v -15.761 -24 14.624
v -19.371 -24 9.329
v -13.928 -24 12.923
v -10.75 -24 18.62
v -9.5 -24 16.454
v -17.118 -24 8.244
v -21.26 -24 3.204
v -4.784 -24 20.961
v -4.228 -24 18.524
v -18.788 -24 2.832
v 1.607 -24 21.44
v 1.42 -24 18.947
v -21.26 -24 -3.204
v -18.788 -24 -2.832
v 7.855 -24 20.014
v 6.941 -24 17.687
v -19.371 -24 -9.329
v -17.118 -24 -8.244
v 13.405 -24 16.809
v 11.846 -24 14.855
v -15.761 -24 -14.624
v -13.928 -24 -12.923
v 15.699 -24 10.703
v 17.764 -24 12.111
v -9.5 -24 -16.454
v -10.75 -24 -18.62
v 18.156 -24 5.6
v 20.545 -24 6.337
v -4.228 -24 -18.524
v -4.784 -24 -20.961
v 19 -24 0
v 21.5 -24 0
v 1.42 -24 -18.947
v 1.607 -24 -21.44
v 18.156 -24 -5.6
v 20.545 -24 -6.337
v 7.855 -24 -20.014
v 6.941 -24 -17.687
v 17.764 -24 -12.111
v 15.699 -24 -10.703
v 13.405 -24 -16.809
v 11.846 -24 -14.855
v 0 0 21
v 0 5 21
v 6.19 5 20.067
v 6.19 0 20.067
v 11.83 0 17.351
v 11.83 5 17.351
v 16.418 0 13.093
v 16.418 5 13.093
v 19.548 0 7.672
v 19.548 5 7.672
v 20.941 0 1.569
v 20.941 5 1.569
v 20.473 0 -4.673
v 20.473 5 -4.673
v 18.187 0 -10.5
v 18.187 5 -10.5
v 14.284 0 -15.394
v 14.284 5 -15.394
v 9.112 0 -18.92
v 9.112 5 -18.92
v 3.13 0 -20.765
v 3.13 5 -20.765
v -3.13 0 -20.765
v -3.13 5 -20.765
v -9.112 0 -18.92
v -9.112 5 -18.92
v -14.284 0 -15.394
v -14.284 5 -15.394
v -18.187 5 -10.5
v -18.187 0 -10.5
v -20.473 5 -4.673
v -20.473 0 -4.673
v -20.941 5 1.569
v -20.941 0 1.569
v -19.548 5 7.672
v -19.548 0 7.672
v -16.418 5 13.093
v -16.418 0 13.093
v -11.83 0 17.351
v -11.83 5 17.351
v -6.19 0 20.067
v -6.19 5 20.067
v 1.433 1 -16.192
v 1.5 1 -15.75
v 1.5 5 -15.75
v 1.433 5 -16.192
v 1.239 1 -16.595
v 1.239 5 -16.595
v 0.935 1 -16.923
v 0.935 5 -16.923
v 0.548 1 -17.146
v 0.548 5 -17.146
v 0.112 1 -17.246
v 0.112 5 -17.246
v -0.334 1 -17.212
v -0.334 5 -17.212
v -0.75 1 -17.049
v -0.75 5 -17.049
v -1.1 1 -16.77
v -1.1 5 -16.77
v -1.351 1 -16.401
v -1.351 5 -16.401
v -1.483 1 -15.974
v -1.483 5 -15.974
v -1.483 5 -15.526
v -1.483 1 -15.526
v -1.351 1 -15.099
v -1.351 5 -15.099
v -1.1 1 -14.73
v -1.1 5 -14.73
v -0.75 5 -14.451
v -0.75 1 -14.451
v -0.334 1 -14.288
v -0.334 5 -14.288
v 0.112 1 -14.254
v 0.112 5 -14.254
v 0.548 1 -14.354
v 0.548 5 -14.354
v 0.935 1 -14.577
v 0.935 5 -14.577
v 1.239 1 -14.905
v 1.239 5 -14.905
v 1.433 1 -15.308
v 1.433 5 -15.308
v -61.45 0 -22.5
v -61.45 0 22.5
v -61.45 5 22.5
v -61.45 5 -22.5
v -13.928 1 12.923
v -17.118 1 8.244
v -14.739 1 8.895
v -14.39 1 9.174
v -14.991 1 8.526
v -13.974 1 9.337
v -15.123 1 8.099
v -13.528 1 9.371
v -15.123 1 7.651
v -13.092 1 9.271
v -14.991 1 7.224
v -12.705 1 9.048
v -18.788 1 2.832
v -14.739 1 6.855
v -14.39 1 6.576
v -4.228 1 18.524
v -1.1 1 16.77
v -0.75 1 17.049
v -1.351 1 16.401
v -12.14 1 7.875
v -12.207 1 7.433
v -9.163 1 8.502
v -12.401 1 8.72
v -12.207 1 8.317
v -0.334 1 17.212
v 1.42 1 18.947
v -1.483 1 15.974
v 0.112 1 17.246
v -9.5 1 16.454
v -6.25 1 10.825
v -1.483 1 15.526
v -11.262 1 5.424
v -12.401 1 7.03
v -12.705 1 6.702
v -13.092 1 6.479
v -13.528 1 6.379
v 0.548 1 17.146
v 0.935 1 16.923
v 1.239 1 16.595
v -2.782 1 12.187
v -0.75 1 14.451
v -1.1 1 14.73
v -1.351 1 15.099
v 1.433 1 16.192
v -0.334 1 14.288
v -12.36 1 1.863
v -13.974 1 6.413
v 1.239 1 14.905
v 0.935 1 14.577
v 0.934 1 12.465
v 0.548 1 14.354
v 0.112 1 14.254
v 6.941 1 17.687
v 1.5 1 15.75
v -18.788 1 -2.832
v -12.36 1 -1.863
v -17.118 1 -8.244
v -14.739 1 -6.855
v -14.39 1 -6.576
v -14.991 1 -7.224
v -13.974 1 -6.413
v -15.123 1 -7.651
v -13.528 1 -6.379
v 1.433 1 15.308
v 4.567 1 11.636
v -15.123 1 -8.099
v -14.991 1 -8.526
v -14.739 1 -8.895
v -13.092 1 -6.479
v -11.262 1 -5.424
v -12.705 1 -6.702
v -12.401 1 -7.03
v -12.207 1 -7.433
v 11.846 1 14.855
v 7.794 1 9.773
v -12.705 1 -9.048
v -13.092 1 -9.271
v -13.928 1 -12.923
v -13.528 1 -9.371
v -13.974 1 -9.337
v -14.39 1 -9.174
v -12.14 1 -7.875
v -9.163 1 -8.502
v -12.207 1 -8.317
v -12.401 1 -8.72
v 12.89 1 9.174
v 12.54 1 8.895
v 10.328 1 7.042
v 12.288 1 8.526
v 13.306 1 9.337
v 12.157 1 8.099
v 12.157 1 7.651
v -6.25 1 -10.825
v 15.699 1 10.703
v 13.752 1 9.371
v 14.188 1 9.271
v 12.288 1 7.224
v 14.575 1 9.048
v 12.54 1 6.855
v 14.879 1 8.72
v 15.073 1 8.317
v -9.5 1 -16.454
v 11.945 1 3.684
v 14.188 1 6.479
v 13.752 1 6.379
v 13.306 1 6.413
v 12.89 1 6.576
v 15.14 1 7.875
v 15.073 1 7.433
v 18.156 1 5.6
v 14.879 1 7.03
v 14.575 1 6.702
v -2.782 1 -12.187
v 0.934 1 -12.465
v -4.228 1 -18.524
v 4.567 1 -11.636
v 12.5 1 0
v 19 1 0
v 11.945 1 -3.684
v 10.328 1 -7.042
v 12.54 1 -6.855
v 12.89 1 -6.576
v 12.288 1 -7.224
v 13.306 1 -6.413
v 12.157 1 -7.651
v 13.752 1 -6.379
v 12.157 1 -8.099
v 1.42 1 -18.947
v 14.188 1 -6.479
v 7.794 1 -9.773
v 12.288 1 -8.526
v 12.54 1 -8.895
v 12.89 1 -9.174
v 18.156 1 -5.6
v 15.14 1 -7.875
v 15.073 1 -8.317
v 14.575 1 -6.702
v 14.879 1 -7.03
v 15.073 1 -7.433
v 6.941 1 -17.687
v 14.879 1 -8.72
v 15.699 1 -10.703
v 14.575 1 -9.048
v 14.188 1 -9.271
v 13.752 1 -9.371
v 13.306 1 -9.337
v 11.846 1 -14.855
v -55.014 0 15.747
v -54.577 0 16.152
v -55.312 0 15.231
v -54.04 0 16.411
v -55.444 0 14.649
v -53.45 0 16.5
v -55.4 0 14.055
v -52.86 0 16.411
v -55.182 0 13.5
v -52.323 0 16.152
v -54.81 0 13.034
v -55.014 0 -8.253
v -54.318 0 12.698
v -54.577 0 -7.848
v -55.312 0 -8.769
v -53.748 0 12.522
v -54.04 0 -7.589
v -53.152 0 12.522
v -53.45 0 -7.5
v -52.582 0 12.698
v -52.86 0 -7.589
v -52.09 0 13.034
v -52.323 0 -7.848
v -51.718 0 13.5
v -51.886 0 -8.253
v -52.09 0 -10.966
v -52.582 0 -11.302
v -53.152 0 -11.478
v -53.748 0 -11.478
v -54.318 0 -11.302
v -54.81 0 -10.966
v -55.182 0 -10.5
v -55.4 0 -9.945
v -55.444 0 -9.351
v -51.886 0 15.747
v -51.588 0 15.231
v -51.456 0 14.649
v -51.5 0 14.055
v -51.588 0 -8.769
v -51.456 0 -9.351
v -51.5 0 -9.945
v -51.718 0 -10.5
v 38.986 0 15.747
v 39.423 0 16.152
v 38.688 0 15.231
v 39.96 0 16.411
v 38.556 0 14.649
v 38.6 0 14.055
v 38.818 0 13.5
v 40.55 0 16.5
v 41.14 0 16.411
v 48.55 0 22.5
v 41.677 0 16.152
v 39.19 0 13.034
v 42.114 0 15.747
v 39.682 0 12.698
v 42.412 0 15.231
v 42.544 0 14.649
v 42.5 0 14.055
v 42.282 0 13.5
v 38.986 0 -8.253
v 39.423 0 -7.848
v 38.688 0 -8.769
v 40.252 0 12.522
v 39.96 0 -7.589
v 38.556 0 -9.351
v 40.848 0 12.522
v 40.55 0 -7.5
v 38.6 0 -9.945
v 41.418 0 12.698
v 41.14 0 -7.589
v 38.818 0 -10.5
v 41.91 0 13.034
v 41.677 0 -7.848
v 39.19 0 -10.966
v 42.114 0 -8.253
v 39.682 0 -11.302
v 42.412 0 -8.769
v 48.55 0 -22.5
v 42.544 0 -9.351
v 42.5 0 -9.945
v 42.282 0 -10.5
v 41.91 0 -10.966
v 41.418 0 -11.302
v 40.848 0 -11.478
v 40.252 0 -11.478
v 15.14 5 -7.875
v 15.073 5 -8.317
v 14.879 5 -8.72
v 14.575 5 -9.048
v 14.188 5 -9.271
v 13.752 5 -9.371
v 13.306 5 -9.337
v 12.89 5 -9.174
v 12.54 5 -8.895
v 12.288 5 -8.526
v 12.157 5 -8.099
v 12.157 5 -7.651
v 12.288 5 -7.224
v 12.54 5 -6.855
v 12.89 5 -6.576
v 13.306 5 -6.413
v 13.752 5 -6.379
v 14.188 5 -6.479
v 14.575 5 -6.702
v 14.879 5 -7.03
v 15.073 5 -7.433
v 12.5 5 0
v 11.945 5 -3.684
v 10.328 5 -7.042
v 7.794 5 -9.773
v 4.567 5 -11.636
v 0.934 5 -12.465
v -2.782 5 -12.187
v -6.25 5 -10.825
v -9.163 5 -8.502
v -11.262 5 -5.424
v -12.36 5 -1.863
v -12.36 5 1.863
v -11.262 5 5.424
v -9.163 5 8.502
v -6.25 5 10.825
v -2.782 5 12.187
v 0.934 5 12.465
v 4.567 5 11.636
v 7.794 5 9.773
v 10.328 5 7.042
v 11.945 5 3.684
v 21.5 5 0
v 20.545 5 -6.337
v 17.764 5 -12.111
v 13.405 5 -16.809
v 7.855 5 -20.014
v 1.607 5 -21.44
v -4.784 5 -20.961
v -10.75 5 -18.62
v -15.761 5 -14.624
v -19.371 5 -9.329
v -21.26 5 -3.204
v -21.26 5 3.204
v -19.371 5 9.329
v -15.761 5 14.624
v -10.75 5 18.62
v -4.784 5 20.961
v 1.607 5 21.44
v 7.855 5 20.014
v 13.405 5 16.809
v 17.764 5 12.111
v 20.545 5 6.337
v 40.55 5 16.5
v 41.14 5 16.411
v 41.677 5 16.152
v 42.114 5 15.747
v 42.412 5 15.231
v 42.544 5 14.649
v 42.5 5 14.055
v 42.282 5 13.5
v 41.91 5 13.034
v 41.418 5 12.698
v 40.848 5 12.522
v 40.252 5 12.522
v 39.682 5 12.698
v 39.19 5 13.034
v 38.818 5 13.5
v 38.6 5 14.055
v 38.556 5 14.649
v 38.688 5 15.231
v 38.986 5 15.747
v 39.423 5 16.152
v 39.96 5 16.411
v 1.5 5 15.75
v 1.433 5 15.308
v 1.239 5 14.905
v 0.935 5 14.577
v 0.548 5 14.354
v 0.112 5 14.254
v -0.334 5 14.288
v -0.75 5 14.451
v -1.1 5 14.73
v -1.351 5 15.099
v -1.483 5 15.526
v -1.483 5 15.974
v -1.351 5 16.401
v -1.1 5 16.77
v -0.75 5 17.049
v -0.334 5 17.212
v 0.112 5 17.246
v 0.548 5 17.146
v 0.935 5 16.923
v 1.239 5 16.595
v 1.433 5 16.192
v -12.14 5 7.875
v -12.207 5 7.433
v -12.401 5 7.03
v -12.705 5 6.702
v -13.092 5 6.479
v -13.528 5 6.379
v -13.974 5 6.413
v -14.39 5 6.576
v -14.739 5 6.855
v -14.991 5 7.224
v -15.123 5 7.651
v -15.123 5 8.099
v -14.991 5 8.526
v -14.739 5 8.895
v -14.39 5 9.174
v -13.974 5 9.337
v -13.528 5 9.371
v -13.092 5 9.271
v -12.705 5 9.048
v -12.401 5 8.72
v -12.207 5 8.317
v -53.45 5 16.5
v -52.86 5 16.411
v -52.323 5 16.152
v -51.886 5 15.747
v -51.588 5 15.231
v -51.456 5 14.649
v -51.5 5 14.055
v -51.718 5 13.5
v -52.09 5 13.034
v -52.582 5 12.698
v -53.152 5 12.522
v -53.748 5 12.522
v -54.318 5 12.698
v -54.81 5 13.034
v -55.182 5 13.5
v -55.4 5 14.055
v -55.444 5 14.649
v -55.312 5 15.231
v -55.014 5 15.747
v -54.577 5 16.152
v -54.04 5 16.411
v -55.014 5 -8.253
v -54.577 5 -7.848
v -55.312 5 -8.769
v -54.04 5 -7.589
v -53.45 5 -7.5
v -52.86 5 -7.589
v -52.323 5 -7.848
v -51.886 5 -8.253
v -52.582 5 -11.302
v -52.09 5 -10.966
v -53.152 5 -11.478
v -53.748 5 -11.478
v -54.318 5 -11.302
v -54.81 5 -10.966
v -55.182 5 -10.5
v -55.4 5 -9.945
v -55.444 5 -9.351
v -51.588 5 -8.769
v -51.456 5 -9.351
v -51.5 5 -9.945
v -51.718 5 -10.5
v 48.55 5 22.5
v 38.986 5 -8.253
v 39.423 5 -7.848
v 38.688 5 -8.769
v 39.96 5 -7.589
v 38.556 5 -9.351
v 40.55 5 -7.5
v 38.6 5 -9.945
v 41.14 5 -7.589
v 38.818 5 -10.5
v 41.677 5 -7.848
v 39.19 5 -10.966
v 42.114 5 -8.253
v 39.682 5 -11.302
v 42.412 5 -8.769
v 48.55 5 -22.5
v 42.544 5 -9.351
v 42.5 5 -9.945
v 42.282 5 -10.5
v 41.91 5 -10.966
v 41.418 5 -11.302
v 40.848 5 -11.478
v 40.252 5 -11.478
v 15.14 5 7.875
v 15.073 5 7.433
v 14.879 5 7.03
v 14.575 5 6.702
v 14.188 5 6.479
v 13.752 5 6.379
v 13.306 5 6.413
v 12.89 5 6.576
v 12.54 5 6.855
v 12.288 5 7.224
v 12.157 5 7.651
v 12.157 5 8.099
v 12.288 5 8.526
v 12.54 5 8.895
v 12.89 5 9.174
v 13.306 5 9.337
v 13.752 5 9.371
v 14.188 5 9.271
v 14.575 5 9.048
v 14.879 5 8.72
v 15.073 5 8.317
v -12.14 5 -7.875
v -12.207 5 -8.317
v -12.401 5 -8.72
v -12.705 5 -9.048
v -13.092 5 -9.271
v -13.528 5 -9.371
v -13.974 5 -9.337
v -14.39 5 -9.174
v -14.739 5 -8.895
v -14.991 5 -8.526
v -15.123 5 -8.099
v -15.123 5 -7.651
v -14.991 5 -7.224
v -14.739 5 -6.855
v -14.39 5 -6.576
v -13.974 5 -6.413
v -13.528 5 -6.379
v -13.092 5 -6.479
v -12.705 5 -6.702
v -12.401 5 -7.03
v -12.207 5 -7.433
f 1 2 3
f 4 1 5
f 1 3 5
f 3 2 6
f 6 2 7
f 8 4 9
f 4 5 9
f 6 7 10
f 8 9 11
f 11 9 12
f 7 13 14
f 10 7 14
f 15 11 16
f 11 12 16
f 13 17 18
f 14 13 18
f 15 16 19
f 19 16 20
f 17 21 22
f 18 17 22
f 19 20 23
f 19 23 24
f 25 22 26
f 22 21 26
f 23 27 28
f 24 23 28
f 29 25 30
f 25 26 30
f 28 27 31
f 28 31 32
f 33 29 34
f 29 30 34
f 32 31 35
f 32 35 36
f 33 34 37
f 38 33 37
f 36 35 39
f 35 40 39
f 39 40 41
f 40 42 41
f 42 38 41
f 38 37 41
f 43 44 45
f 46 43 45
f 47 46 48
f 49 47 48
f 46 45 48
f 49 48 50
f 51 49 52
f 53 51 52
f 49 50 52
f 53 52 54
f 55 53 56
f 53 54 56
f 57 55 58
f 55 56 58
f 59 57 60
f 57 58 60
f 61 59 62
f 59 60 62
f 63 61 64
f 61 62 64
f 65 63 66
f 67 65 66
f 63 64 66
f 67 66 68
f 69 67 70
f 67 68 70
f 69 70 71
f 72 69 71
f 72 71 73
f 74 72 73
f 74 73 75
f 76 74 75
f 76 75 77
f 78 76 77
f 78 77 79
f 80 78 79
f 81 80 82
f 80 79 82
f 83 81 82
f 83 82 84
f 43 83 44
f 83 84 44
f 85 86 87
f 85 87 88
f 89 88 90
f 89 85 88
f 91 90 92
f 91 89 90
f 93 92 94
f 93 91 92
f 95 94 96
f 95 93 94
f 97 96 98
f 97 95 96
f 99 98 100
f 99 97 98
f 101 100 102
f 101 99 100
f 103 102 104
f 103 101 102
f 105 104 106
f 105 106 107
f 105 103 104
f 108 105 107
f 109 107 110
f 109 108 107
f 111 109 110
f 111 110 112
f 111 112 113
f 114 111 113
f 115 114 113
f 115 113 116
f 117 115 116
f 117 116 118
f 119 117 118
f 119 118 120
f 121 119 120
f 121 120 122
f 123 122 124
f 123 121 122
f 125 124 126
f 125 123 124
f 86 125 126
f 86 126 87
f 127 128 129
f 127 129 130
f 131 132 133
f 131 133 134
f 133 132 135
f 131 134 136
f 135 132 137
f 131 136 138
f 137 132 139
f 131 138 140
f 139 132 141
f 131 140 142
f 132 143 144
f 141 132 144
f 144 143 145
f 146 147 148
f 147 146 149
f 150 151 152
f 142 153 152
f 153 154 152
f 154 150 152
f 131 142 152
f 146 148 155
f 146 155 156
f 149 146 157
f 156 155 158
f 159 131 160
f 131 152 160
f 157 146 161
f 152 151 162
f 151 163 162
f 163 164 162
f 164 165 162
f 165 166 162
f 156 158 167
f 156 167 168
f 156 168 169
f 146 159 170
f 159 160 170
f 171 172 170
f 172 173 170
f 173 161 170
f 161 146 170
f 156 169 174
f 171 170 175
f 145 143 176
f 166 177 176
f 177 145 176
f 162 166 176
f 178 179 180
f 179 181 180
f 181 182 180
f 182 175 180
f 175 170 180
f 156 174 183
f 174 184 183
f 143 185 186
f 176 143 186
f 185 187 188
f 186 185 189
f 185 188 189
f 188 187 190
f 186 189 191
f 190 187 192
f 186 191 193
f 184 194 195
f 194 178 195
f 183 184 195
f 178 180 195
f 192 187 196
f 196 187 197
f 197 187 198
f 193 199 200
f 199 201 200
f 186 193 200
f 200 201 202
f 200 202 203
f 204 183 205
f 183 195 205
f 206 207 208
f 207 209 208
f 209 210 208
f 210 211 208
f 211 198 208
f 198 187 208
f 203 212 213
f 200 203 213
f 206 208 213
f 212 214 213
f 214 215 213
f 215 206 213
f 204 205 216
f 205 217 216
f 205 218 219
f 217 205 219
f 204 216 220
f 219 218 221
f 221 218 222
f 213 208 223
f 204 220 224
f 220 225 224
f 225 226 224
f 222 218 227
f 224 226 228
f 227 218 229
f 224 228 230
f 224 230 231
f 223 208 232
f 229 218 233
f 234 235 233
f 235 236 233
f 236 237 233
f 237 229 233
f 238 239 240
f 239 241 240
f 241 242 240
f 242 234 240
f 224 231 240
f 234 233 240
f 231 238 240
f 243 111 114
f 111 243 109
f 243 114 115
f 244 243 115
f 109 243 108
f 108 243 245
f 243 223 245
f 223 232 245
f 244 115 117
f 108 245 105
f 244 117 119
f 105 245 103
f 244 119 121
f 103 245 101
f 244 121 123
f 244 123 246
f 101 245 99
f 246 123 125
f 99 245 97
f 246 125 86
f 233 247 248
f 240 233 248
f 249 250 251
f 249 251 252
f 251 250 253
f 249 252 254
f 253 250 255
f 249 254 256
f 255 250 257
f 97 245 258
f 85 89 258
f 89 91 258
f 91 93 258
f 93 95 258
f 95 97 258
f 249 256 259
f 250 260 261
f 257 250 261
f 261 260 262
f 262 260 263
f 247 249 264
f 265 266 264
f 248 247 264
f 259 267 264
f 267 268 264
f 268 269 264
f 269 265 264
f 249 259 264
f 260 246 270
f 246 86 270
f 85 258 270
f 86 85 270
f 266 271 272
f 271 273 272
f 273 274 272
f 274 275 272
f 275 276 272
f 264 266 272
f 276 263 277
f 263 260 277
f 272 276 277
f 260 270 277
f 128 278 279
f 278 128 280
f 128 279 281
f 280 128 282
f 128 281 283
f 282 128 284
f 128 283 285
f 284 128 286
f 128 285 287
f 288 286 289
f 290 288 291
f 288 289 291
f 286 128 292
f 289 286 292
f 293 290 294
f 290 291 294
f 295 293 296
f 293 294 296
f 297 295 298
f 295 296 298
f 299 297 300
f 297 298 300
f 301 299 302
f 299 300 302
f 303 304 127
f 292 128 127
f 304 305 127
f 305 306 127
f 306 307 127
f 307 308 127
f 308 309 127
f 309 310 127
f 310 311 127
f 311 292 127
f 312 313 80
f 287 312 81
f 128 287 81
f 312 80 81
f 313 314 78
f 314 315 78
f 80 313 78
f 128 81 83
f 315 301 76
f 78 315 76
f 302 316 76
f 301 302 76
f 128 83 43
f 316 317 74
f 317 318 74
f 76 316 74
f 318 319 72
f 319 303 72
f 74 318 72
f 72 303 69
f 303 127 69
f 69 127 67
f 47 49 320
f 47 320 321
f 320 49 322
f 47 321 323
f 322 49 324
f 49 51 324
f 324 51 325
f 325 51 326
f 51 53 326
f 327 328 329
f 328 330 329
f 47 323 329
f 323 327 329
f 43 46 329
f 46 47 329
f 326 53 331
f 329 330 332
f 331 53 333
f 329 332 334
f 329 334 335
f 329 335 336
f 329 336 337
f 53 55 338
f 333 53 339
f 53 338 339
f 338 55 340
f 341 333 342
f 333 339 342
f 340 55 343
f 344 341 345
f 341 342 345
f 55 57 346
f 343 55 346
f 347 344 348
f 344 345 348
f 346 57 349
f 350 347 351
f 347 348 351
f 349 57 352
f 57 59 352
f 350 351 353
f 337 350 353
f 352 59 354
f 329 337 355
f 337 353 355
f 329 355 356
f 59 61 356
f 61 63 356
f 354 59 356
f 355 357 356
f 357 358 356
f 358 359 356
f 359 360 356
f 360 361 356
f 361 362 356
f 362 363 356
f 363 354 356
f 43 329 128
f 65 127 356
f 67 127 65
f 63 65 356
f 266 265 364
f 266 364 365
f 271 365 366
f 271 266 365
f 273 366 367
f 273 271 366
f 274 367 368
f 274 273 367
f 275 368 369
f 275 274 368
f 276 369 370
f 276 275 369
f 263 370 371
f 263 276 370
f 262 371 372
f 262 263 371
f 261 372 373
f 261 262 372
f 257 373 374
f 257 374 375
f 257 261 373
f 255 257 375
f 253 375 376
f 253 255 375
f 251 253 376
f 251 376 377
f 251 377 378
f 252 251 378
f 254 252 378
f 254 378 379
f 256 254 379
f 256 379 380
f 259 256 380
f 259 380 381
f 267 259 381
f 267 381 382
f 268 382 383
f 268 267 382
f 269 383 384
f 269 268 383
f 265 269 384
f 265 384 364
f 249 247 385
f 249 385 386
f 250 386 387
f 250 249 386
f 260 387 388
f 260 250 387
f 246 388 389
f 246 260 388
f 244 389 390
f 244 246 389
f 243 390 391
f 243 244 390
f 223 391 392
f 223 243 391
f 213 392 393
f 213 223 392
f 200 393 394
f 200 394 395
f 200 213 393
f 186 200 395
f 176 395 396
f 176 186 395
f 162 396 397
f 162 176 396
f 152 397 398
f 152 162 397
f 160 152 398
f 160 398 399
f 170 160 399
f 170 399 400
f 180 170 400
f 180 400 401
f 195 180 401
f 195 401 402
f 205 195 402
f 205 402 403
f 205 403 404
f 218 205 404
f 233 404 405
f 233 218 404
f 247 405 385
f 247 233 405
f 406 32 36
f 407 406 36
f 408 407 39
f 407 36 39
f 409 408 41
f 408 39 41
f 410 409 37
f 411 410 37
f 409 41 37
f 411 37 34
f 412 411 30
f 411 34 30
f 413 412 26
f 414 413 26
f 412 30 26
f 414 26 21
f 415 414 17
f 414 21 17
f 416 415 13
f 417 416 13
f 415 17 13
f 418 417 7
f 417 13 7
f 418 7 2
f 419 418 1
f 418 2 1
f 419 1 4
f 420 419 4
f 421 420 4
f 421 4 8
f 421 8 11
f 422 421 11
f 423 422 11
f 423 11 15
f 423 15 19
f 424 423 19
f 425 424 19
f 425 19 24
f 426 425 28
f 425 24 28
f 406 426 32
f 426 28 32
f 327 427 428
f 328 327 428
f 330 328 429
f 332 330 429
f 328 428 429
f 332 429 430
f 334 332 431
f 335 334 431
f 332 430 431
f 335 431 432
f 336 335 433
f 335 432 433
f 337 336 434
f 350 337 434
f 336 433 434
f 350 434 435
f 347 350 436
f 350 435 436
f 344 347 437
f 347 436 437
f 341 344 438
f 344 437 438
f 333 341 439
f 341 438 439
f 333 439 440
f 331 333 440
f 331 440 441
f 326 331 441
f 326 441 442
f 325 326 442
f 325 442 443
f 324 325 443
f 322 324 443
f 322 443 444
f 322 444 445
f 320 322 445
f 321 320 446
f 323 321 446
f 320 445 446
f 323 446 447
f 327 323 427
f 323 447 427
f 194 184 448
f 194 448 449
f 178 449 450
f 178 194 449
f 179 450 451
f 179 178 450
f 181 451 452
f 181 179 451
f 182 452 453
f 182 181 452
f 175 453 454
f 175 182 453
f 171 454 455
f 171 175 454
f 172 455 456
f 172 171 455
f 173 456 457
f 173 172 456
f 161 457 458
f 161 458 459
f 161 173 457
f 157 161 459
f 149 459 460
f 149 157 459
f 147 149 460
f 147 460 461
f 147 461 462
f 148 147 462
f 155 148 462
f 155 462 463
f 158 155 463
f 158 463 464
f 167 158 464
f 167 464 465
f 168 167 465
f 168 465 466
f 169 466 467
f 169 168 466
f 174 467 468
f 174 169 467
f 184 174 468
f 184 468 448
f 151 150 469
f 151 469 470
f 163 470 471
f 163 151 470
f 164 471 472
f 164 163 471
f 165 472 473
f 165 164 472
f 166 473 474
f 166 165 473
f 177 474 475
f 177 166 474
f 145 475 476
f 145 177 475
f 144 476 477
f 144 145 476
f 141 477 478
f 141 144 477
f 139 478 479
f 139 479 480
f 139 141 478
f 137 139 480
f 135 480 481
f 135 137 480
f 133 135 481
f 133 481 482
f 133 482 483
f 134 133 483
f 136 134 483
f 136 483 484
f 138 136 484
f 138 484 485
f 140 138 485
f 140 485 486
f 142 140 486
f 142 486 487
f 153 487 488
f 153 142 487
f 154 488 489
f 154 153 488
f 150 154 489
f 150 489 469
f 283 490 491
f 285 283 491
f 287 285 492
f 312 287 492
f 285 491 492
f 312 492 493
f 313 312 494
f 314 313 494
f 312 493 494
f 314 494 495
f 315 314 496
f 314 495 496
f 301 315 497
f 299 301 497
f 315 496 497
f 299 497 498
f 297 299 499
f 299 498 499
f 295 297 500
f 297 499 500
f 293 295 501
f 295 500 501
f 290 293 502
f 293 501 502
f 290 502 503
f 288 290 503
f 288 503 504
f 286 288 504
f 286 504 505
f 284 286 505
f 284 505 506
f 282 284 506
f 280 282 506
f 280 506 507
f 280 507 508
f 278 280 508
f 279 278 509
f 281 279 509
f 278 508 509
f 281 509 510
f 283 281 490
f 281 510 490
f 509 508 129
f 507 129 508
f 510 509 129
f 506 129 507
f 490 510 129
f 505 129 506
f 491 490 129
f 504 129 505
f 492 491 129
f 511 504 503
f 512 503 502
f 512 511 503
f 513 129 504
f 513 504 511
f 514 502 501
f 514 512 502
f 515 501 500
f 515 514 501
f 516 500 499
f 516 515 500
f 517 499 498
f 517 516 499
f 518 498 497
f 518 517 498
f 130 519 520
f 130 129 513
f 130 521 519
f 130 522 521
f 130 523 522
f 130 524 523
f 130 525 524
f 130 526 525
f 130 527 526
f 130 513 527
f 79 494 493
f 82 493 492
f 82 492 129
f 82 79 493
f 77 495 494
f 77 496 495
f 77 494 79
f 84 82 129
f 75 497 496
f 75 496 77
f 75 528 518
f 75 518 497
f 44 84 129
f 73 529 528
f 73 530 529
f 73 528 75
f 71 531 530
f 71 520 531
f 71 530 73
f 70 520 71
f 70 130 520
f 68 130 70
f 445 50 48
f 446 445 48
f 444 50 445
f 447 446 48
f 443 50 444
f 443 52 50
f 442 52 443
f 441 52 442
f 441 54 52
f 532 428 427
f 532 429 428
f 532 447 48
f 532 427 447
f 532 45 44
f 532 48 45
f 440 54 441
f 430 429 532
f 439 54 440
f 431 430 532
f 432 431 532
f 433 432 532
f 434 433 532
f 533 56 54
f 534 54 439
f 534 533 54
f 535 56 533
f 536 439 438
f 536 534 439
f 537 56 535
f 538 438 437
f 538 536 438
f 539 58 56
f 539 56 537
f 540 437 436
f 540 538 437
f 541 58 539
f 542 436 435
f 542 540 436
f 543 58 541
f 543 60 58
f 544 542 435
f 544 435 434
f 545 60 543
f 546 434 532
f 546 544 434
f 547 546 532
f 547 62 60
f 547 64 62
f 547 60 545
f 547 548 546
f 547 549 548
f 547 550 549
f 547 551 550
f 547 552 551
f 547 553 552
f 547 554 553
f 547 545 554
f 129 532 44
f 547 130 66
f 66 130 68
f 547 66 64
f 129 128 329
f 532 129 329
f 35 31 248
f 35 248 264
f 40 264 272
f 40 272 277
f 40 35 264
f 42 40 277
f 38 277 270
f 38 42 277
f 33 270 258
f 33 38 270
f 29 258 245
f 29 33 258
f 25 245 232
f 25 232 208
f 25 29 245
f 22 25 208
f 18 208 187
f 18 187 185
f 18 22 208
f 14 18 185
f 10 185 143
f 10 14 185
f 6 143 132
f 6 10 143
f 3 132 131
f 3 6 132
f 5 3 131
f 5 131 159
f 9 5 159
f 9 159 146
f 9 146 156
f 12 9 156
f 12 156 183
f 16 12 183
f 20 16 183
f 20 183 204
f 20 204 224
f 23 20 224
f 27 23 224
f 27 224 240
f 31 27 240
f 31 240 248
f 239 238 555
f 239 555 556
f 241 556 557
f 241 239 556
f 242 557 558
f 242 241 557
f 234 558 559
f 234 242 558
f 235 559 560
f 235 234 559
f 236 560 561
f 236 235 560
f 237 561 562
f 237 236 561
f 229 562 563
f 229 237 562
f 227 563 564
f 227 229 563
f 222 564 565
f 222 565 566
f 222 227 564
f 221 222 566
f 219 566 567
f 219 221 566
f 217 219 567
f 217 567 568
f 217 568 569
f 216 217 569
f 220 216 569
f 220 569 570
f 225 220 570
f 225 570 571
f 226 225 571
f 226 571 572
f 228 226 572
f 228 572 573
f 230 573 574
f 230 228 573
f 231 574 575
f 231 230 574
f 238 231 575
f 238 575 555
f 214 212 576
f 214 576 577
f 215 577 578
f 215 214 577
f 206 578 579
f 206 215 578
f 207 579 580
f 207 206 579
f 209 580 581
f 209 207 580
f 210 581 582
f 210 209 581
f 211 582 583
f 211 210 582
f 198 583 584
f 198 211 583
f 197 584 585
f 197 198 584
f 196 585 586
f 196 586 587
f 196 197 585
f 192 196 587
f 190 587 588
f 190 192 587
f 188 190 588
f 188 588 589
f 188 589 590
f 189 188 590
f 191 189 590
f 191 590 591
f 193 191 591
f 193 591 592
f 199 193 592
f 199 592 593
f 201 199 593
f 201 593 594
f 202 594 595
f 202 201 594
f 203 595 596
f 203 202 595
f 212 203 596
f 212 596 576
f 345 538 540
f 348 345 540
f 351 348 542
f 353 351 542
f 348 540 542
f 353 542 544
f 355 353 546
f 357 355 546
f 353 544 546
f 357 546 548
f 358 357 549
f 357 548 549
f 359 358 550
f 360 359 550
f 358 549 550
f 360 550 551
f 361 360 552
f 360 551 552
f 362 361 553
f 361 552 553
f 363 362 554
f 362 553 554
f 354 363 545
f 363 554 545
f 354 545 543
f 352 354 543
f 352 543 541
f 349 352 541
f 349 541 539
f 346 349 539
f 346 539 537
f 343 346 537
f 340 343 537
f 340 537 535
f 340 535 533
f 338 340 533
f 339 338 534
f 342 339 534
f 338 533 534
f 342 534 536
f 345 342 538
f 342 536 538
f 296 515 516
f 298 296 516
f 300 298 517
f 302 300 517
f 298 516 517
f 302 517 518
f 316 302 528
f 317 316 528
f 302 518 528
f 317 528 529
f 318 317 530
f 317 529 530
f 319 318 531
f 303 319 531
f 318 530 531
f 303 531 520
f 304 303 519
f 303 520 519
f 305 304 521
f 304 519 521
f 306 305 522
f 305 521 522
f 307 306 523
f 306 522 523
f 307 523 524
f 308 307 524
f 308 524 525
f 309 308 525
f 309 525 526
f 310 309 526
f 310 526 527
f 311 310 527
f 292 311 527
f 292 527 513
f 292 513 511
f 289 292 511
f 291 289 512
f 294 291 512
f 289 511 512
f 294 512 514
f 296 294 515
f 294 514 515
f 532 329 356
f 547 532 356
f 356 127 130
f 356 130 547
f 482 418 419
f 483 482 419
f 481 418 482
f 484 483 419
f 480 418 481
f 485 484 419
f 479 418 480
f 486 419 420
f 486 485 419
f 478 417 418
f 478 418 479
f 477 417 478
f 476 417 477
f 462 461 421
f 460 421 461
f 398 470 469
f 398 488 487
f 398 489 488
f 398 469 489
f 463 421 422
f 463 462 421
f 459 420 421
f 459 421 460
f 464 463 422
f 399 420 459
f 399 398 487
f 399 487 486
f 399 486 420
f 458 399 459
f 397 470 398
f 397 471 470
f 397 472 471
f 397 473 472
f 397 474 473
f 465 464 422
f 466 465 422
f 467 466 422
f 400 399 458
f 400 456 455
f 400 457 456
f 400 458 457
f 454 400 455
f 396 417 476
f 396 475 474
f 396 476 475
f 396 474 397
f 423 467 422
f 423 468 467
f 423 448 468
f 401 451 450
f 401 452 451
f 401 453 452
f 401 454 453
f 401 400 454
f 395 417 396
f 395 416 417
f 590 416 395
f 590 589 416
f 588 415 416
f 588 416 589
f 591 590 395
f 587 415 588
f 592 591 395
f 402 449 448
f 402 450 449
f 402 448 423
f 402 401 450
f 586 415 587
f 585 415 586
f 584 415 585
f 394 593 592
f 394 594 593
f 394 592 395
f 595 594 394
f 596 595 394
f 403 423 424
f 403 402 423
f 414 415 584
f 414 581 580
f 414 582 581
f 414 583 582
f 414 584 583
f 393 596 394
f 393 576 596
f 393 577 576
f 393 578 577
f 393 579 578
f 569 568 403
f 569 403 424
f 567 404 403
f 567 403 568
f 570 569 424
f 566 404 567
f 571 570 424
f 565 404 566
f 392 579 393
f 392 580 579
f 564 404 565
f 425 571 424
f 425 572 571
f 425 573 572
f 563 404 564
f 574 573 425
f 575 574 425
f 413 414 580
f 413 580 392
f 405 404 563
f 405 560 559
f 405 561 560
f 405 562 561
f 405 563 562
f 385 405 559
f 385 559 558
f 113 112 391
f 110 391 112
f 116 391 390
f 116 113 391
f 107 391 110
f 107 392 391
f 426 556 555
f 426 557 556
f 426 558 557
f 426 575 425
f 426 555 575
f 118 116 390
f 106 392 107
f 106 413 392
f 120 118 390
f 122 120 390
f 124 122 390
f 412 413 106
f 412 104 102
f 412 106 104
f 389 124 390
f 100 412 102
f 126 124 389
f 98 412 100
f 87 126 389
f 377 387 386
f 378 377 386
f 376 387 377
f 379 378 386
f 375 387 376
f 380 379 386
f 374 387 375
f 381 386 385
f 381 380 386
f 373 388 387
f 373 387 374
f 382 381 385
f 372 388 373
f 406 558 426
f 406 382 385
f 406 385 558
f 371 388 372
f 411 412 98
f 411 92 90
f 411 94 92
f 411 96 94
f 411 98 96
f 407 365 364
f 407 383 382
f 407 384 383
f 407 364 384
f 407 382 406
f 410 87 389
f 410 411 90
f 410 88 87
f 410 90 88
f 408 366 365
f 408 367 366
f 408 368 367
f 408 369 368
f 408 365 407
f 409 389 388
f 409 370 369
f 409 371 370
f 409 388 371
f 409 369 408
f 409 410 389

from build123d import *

# Parameters (mm, degrees)
SKETCH1_W                 = 110
SKETCH1_H                 = 45
BOSS_EXTRUDE1_DEPTH       = 5
SKETCH2_R                 = 21
CUT_EXTRUDE1_DEPTH        = 5
MOTOR_MOUNT_START         = -24
MOTOR_MOUNT_OUTLINE_R     = 21.5
MOTOR_MOUNT_OUTLINE_R_2   = 19
MOTOR_MOUNT_DEPTH         = 29
MOTOR_MOUNT_START_2       = 1
MOTOR_MOUNT_2_OUTLINE_R   = 19
MOTOR_MOUNT_2_OUTLINE_R_2 = 1.5
MOTOR_MOUNT_2_OUTLINE_R_3 = 12.5
MOTOR_MOUNT_2_DEPTH       = 4
SKETCH6_R                 = 2
CUT_EXTRUDE2_DEPTH        = 5
SKETCH7_R                 = 2
CUT_EXTRUDE3_DEPTH        = 5


# Read off the part's stored shape, not the designer's step: motor_mount
with BuildPart() as part:
    # Sketch1 → Boss-Extrude1 (new body)
    with BuildSketch(Plane(origin=(0, 0, 0), x_dir=(1, 0, 0), z_dir=(0, 1, 0))):
        with Locations((-6.45, 0)):
            Rectangle(SKETCH1_W, SKETCH1_H)
    extrude(amount=BOSS_EXTRUDE1_DEPTH)

    # Sketch2 → Cut-Extrude1 (cut)
    with BuildSketch(Plane(origin=(0, 5, 0), x_dir=(1, 0, 0), z_dir=(0, 1, 0))):
        with Locations(Location((0, 0, 0), (0, 0, 270))):
            Circle(SKETCH2_R)
    extrude(amount=-CUT_EXTRUDE1_DEPTH, mode=Mode.SUBTRACT)

    # Sketch6 → Cut-Extrude2 (cut)
    with BuildSketch(Plane(origin=(0, 5, 0), x_dir=(1, 0, 0), z_dir=(0, 1, 0))):
        with Locations(Location((40.55, -14.5, 0), (0, 0, 270))):
            Circle(SKETCH6_R)
        with Locations(Location((40.55, 9.5, 0), (0, 0, 270))):
            Circle(SKETCH6_R)
    extrude(amount=-CUT_EXTRUDE2_DEPTH, mode=Mode.SUBTRACT)

    # Sketch7 → Cut-Extrude3 (cut)
    with BuildSketch(Plane(origin=(0, 5, 0), x_dir=(1, 0, 0), z_dir=(0, 1, 0))):
        with Locations(Location((-53.45, -14.5, 0), (0, 0, 270))):
            Circle(SKETCH7_R)
        with Locations(Location((-53.45, 9.5, 0), (0, 0, 270))):
            Circle(SKETCH7_R)
    extrude(amount=-CUT_EXTRUDE3_DEPTH, mode=Mode.SUBTRACT)


with BuildPart() as body_2:
    # motor_mount outline → motor_mount (new body)
    with BuildSketch(Plane(origin=(0, 0, 0), x_dir=(1, 0, 0), z_dir=(0, 1, 0)).offset(MOTOR_MOUNT_START)):
        Circle(MOTOR_MOUNT_OUTLINE_R)
        Circle(MOTOR_MOUNT_OUTLINE_R_2, mode=Mode.SUBTRACT)
    extrude(amount=MOTOR_MOUNT_DEPTH)

    # motor_mount 2 outline → motor_mount 2 (add)
    with BuildSketch(Plane(origin=(0, 0, 0), x_dir=(1, 0, 0), z_dir=(0, 1, 0)).offset(MOTOR_MOUNT_START_2)):
        Circle(MOTOR_MOUNT_2_OUTLINE_R)
        with Locations((-13.63990011, -7.875)):
            Circle(MOTOR_MOUNT_2_OUTLINE_R_2, mode=Mode.SUBTRACT)
        with Locations((0, -15.75)):
            Circle(MOTOR_MOUNT_2_OUTLINE_R_2, mode=Mode.SUBTRACT)
        with Locations((13.63990011, -7.875)):
            Circle(MOTOR_MOUNT_2_OUTLINE_R_2, mode=Mode.SUBTRACT)
        with Locations((-13.63990011, 7.875)):
            Circle(MOTOR_MOUNT_2_OUTLINE_R_2, mode=Mode.SUBTRACT)
        Circle(MOTOR_MOUNT_2_OUTLINE_R_3, mode=Mode.SUBTRACT)
        with Locations((13.63990011, 7.875)):
            Circle(MOTOR_MOUNT_2_OUTLINE_R_2, mode=Mode.SUBTRACT)
        with Locations((0, 15.75)):
            Circle(MOTOR_MOUNT_2_OUTLINE_R_2, mode=Mode.SUBTRACT)
    extrude(amount=MOTOR_MOUNT_2_DEPTH)


solid = Compound([part.part, body_2.part])
